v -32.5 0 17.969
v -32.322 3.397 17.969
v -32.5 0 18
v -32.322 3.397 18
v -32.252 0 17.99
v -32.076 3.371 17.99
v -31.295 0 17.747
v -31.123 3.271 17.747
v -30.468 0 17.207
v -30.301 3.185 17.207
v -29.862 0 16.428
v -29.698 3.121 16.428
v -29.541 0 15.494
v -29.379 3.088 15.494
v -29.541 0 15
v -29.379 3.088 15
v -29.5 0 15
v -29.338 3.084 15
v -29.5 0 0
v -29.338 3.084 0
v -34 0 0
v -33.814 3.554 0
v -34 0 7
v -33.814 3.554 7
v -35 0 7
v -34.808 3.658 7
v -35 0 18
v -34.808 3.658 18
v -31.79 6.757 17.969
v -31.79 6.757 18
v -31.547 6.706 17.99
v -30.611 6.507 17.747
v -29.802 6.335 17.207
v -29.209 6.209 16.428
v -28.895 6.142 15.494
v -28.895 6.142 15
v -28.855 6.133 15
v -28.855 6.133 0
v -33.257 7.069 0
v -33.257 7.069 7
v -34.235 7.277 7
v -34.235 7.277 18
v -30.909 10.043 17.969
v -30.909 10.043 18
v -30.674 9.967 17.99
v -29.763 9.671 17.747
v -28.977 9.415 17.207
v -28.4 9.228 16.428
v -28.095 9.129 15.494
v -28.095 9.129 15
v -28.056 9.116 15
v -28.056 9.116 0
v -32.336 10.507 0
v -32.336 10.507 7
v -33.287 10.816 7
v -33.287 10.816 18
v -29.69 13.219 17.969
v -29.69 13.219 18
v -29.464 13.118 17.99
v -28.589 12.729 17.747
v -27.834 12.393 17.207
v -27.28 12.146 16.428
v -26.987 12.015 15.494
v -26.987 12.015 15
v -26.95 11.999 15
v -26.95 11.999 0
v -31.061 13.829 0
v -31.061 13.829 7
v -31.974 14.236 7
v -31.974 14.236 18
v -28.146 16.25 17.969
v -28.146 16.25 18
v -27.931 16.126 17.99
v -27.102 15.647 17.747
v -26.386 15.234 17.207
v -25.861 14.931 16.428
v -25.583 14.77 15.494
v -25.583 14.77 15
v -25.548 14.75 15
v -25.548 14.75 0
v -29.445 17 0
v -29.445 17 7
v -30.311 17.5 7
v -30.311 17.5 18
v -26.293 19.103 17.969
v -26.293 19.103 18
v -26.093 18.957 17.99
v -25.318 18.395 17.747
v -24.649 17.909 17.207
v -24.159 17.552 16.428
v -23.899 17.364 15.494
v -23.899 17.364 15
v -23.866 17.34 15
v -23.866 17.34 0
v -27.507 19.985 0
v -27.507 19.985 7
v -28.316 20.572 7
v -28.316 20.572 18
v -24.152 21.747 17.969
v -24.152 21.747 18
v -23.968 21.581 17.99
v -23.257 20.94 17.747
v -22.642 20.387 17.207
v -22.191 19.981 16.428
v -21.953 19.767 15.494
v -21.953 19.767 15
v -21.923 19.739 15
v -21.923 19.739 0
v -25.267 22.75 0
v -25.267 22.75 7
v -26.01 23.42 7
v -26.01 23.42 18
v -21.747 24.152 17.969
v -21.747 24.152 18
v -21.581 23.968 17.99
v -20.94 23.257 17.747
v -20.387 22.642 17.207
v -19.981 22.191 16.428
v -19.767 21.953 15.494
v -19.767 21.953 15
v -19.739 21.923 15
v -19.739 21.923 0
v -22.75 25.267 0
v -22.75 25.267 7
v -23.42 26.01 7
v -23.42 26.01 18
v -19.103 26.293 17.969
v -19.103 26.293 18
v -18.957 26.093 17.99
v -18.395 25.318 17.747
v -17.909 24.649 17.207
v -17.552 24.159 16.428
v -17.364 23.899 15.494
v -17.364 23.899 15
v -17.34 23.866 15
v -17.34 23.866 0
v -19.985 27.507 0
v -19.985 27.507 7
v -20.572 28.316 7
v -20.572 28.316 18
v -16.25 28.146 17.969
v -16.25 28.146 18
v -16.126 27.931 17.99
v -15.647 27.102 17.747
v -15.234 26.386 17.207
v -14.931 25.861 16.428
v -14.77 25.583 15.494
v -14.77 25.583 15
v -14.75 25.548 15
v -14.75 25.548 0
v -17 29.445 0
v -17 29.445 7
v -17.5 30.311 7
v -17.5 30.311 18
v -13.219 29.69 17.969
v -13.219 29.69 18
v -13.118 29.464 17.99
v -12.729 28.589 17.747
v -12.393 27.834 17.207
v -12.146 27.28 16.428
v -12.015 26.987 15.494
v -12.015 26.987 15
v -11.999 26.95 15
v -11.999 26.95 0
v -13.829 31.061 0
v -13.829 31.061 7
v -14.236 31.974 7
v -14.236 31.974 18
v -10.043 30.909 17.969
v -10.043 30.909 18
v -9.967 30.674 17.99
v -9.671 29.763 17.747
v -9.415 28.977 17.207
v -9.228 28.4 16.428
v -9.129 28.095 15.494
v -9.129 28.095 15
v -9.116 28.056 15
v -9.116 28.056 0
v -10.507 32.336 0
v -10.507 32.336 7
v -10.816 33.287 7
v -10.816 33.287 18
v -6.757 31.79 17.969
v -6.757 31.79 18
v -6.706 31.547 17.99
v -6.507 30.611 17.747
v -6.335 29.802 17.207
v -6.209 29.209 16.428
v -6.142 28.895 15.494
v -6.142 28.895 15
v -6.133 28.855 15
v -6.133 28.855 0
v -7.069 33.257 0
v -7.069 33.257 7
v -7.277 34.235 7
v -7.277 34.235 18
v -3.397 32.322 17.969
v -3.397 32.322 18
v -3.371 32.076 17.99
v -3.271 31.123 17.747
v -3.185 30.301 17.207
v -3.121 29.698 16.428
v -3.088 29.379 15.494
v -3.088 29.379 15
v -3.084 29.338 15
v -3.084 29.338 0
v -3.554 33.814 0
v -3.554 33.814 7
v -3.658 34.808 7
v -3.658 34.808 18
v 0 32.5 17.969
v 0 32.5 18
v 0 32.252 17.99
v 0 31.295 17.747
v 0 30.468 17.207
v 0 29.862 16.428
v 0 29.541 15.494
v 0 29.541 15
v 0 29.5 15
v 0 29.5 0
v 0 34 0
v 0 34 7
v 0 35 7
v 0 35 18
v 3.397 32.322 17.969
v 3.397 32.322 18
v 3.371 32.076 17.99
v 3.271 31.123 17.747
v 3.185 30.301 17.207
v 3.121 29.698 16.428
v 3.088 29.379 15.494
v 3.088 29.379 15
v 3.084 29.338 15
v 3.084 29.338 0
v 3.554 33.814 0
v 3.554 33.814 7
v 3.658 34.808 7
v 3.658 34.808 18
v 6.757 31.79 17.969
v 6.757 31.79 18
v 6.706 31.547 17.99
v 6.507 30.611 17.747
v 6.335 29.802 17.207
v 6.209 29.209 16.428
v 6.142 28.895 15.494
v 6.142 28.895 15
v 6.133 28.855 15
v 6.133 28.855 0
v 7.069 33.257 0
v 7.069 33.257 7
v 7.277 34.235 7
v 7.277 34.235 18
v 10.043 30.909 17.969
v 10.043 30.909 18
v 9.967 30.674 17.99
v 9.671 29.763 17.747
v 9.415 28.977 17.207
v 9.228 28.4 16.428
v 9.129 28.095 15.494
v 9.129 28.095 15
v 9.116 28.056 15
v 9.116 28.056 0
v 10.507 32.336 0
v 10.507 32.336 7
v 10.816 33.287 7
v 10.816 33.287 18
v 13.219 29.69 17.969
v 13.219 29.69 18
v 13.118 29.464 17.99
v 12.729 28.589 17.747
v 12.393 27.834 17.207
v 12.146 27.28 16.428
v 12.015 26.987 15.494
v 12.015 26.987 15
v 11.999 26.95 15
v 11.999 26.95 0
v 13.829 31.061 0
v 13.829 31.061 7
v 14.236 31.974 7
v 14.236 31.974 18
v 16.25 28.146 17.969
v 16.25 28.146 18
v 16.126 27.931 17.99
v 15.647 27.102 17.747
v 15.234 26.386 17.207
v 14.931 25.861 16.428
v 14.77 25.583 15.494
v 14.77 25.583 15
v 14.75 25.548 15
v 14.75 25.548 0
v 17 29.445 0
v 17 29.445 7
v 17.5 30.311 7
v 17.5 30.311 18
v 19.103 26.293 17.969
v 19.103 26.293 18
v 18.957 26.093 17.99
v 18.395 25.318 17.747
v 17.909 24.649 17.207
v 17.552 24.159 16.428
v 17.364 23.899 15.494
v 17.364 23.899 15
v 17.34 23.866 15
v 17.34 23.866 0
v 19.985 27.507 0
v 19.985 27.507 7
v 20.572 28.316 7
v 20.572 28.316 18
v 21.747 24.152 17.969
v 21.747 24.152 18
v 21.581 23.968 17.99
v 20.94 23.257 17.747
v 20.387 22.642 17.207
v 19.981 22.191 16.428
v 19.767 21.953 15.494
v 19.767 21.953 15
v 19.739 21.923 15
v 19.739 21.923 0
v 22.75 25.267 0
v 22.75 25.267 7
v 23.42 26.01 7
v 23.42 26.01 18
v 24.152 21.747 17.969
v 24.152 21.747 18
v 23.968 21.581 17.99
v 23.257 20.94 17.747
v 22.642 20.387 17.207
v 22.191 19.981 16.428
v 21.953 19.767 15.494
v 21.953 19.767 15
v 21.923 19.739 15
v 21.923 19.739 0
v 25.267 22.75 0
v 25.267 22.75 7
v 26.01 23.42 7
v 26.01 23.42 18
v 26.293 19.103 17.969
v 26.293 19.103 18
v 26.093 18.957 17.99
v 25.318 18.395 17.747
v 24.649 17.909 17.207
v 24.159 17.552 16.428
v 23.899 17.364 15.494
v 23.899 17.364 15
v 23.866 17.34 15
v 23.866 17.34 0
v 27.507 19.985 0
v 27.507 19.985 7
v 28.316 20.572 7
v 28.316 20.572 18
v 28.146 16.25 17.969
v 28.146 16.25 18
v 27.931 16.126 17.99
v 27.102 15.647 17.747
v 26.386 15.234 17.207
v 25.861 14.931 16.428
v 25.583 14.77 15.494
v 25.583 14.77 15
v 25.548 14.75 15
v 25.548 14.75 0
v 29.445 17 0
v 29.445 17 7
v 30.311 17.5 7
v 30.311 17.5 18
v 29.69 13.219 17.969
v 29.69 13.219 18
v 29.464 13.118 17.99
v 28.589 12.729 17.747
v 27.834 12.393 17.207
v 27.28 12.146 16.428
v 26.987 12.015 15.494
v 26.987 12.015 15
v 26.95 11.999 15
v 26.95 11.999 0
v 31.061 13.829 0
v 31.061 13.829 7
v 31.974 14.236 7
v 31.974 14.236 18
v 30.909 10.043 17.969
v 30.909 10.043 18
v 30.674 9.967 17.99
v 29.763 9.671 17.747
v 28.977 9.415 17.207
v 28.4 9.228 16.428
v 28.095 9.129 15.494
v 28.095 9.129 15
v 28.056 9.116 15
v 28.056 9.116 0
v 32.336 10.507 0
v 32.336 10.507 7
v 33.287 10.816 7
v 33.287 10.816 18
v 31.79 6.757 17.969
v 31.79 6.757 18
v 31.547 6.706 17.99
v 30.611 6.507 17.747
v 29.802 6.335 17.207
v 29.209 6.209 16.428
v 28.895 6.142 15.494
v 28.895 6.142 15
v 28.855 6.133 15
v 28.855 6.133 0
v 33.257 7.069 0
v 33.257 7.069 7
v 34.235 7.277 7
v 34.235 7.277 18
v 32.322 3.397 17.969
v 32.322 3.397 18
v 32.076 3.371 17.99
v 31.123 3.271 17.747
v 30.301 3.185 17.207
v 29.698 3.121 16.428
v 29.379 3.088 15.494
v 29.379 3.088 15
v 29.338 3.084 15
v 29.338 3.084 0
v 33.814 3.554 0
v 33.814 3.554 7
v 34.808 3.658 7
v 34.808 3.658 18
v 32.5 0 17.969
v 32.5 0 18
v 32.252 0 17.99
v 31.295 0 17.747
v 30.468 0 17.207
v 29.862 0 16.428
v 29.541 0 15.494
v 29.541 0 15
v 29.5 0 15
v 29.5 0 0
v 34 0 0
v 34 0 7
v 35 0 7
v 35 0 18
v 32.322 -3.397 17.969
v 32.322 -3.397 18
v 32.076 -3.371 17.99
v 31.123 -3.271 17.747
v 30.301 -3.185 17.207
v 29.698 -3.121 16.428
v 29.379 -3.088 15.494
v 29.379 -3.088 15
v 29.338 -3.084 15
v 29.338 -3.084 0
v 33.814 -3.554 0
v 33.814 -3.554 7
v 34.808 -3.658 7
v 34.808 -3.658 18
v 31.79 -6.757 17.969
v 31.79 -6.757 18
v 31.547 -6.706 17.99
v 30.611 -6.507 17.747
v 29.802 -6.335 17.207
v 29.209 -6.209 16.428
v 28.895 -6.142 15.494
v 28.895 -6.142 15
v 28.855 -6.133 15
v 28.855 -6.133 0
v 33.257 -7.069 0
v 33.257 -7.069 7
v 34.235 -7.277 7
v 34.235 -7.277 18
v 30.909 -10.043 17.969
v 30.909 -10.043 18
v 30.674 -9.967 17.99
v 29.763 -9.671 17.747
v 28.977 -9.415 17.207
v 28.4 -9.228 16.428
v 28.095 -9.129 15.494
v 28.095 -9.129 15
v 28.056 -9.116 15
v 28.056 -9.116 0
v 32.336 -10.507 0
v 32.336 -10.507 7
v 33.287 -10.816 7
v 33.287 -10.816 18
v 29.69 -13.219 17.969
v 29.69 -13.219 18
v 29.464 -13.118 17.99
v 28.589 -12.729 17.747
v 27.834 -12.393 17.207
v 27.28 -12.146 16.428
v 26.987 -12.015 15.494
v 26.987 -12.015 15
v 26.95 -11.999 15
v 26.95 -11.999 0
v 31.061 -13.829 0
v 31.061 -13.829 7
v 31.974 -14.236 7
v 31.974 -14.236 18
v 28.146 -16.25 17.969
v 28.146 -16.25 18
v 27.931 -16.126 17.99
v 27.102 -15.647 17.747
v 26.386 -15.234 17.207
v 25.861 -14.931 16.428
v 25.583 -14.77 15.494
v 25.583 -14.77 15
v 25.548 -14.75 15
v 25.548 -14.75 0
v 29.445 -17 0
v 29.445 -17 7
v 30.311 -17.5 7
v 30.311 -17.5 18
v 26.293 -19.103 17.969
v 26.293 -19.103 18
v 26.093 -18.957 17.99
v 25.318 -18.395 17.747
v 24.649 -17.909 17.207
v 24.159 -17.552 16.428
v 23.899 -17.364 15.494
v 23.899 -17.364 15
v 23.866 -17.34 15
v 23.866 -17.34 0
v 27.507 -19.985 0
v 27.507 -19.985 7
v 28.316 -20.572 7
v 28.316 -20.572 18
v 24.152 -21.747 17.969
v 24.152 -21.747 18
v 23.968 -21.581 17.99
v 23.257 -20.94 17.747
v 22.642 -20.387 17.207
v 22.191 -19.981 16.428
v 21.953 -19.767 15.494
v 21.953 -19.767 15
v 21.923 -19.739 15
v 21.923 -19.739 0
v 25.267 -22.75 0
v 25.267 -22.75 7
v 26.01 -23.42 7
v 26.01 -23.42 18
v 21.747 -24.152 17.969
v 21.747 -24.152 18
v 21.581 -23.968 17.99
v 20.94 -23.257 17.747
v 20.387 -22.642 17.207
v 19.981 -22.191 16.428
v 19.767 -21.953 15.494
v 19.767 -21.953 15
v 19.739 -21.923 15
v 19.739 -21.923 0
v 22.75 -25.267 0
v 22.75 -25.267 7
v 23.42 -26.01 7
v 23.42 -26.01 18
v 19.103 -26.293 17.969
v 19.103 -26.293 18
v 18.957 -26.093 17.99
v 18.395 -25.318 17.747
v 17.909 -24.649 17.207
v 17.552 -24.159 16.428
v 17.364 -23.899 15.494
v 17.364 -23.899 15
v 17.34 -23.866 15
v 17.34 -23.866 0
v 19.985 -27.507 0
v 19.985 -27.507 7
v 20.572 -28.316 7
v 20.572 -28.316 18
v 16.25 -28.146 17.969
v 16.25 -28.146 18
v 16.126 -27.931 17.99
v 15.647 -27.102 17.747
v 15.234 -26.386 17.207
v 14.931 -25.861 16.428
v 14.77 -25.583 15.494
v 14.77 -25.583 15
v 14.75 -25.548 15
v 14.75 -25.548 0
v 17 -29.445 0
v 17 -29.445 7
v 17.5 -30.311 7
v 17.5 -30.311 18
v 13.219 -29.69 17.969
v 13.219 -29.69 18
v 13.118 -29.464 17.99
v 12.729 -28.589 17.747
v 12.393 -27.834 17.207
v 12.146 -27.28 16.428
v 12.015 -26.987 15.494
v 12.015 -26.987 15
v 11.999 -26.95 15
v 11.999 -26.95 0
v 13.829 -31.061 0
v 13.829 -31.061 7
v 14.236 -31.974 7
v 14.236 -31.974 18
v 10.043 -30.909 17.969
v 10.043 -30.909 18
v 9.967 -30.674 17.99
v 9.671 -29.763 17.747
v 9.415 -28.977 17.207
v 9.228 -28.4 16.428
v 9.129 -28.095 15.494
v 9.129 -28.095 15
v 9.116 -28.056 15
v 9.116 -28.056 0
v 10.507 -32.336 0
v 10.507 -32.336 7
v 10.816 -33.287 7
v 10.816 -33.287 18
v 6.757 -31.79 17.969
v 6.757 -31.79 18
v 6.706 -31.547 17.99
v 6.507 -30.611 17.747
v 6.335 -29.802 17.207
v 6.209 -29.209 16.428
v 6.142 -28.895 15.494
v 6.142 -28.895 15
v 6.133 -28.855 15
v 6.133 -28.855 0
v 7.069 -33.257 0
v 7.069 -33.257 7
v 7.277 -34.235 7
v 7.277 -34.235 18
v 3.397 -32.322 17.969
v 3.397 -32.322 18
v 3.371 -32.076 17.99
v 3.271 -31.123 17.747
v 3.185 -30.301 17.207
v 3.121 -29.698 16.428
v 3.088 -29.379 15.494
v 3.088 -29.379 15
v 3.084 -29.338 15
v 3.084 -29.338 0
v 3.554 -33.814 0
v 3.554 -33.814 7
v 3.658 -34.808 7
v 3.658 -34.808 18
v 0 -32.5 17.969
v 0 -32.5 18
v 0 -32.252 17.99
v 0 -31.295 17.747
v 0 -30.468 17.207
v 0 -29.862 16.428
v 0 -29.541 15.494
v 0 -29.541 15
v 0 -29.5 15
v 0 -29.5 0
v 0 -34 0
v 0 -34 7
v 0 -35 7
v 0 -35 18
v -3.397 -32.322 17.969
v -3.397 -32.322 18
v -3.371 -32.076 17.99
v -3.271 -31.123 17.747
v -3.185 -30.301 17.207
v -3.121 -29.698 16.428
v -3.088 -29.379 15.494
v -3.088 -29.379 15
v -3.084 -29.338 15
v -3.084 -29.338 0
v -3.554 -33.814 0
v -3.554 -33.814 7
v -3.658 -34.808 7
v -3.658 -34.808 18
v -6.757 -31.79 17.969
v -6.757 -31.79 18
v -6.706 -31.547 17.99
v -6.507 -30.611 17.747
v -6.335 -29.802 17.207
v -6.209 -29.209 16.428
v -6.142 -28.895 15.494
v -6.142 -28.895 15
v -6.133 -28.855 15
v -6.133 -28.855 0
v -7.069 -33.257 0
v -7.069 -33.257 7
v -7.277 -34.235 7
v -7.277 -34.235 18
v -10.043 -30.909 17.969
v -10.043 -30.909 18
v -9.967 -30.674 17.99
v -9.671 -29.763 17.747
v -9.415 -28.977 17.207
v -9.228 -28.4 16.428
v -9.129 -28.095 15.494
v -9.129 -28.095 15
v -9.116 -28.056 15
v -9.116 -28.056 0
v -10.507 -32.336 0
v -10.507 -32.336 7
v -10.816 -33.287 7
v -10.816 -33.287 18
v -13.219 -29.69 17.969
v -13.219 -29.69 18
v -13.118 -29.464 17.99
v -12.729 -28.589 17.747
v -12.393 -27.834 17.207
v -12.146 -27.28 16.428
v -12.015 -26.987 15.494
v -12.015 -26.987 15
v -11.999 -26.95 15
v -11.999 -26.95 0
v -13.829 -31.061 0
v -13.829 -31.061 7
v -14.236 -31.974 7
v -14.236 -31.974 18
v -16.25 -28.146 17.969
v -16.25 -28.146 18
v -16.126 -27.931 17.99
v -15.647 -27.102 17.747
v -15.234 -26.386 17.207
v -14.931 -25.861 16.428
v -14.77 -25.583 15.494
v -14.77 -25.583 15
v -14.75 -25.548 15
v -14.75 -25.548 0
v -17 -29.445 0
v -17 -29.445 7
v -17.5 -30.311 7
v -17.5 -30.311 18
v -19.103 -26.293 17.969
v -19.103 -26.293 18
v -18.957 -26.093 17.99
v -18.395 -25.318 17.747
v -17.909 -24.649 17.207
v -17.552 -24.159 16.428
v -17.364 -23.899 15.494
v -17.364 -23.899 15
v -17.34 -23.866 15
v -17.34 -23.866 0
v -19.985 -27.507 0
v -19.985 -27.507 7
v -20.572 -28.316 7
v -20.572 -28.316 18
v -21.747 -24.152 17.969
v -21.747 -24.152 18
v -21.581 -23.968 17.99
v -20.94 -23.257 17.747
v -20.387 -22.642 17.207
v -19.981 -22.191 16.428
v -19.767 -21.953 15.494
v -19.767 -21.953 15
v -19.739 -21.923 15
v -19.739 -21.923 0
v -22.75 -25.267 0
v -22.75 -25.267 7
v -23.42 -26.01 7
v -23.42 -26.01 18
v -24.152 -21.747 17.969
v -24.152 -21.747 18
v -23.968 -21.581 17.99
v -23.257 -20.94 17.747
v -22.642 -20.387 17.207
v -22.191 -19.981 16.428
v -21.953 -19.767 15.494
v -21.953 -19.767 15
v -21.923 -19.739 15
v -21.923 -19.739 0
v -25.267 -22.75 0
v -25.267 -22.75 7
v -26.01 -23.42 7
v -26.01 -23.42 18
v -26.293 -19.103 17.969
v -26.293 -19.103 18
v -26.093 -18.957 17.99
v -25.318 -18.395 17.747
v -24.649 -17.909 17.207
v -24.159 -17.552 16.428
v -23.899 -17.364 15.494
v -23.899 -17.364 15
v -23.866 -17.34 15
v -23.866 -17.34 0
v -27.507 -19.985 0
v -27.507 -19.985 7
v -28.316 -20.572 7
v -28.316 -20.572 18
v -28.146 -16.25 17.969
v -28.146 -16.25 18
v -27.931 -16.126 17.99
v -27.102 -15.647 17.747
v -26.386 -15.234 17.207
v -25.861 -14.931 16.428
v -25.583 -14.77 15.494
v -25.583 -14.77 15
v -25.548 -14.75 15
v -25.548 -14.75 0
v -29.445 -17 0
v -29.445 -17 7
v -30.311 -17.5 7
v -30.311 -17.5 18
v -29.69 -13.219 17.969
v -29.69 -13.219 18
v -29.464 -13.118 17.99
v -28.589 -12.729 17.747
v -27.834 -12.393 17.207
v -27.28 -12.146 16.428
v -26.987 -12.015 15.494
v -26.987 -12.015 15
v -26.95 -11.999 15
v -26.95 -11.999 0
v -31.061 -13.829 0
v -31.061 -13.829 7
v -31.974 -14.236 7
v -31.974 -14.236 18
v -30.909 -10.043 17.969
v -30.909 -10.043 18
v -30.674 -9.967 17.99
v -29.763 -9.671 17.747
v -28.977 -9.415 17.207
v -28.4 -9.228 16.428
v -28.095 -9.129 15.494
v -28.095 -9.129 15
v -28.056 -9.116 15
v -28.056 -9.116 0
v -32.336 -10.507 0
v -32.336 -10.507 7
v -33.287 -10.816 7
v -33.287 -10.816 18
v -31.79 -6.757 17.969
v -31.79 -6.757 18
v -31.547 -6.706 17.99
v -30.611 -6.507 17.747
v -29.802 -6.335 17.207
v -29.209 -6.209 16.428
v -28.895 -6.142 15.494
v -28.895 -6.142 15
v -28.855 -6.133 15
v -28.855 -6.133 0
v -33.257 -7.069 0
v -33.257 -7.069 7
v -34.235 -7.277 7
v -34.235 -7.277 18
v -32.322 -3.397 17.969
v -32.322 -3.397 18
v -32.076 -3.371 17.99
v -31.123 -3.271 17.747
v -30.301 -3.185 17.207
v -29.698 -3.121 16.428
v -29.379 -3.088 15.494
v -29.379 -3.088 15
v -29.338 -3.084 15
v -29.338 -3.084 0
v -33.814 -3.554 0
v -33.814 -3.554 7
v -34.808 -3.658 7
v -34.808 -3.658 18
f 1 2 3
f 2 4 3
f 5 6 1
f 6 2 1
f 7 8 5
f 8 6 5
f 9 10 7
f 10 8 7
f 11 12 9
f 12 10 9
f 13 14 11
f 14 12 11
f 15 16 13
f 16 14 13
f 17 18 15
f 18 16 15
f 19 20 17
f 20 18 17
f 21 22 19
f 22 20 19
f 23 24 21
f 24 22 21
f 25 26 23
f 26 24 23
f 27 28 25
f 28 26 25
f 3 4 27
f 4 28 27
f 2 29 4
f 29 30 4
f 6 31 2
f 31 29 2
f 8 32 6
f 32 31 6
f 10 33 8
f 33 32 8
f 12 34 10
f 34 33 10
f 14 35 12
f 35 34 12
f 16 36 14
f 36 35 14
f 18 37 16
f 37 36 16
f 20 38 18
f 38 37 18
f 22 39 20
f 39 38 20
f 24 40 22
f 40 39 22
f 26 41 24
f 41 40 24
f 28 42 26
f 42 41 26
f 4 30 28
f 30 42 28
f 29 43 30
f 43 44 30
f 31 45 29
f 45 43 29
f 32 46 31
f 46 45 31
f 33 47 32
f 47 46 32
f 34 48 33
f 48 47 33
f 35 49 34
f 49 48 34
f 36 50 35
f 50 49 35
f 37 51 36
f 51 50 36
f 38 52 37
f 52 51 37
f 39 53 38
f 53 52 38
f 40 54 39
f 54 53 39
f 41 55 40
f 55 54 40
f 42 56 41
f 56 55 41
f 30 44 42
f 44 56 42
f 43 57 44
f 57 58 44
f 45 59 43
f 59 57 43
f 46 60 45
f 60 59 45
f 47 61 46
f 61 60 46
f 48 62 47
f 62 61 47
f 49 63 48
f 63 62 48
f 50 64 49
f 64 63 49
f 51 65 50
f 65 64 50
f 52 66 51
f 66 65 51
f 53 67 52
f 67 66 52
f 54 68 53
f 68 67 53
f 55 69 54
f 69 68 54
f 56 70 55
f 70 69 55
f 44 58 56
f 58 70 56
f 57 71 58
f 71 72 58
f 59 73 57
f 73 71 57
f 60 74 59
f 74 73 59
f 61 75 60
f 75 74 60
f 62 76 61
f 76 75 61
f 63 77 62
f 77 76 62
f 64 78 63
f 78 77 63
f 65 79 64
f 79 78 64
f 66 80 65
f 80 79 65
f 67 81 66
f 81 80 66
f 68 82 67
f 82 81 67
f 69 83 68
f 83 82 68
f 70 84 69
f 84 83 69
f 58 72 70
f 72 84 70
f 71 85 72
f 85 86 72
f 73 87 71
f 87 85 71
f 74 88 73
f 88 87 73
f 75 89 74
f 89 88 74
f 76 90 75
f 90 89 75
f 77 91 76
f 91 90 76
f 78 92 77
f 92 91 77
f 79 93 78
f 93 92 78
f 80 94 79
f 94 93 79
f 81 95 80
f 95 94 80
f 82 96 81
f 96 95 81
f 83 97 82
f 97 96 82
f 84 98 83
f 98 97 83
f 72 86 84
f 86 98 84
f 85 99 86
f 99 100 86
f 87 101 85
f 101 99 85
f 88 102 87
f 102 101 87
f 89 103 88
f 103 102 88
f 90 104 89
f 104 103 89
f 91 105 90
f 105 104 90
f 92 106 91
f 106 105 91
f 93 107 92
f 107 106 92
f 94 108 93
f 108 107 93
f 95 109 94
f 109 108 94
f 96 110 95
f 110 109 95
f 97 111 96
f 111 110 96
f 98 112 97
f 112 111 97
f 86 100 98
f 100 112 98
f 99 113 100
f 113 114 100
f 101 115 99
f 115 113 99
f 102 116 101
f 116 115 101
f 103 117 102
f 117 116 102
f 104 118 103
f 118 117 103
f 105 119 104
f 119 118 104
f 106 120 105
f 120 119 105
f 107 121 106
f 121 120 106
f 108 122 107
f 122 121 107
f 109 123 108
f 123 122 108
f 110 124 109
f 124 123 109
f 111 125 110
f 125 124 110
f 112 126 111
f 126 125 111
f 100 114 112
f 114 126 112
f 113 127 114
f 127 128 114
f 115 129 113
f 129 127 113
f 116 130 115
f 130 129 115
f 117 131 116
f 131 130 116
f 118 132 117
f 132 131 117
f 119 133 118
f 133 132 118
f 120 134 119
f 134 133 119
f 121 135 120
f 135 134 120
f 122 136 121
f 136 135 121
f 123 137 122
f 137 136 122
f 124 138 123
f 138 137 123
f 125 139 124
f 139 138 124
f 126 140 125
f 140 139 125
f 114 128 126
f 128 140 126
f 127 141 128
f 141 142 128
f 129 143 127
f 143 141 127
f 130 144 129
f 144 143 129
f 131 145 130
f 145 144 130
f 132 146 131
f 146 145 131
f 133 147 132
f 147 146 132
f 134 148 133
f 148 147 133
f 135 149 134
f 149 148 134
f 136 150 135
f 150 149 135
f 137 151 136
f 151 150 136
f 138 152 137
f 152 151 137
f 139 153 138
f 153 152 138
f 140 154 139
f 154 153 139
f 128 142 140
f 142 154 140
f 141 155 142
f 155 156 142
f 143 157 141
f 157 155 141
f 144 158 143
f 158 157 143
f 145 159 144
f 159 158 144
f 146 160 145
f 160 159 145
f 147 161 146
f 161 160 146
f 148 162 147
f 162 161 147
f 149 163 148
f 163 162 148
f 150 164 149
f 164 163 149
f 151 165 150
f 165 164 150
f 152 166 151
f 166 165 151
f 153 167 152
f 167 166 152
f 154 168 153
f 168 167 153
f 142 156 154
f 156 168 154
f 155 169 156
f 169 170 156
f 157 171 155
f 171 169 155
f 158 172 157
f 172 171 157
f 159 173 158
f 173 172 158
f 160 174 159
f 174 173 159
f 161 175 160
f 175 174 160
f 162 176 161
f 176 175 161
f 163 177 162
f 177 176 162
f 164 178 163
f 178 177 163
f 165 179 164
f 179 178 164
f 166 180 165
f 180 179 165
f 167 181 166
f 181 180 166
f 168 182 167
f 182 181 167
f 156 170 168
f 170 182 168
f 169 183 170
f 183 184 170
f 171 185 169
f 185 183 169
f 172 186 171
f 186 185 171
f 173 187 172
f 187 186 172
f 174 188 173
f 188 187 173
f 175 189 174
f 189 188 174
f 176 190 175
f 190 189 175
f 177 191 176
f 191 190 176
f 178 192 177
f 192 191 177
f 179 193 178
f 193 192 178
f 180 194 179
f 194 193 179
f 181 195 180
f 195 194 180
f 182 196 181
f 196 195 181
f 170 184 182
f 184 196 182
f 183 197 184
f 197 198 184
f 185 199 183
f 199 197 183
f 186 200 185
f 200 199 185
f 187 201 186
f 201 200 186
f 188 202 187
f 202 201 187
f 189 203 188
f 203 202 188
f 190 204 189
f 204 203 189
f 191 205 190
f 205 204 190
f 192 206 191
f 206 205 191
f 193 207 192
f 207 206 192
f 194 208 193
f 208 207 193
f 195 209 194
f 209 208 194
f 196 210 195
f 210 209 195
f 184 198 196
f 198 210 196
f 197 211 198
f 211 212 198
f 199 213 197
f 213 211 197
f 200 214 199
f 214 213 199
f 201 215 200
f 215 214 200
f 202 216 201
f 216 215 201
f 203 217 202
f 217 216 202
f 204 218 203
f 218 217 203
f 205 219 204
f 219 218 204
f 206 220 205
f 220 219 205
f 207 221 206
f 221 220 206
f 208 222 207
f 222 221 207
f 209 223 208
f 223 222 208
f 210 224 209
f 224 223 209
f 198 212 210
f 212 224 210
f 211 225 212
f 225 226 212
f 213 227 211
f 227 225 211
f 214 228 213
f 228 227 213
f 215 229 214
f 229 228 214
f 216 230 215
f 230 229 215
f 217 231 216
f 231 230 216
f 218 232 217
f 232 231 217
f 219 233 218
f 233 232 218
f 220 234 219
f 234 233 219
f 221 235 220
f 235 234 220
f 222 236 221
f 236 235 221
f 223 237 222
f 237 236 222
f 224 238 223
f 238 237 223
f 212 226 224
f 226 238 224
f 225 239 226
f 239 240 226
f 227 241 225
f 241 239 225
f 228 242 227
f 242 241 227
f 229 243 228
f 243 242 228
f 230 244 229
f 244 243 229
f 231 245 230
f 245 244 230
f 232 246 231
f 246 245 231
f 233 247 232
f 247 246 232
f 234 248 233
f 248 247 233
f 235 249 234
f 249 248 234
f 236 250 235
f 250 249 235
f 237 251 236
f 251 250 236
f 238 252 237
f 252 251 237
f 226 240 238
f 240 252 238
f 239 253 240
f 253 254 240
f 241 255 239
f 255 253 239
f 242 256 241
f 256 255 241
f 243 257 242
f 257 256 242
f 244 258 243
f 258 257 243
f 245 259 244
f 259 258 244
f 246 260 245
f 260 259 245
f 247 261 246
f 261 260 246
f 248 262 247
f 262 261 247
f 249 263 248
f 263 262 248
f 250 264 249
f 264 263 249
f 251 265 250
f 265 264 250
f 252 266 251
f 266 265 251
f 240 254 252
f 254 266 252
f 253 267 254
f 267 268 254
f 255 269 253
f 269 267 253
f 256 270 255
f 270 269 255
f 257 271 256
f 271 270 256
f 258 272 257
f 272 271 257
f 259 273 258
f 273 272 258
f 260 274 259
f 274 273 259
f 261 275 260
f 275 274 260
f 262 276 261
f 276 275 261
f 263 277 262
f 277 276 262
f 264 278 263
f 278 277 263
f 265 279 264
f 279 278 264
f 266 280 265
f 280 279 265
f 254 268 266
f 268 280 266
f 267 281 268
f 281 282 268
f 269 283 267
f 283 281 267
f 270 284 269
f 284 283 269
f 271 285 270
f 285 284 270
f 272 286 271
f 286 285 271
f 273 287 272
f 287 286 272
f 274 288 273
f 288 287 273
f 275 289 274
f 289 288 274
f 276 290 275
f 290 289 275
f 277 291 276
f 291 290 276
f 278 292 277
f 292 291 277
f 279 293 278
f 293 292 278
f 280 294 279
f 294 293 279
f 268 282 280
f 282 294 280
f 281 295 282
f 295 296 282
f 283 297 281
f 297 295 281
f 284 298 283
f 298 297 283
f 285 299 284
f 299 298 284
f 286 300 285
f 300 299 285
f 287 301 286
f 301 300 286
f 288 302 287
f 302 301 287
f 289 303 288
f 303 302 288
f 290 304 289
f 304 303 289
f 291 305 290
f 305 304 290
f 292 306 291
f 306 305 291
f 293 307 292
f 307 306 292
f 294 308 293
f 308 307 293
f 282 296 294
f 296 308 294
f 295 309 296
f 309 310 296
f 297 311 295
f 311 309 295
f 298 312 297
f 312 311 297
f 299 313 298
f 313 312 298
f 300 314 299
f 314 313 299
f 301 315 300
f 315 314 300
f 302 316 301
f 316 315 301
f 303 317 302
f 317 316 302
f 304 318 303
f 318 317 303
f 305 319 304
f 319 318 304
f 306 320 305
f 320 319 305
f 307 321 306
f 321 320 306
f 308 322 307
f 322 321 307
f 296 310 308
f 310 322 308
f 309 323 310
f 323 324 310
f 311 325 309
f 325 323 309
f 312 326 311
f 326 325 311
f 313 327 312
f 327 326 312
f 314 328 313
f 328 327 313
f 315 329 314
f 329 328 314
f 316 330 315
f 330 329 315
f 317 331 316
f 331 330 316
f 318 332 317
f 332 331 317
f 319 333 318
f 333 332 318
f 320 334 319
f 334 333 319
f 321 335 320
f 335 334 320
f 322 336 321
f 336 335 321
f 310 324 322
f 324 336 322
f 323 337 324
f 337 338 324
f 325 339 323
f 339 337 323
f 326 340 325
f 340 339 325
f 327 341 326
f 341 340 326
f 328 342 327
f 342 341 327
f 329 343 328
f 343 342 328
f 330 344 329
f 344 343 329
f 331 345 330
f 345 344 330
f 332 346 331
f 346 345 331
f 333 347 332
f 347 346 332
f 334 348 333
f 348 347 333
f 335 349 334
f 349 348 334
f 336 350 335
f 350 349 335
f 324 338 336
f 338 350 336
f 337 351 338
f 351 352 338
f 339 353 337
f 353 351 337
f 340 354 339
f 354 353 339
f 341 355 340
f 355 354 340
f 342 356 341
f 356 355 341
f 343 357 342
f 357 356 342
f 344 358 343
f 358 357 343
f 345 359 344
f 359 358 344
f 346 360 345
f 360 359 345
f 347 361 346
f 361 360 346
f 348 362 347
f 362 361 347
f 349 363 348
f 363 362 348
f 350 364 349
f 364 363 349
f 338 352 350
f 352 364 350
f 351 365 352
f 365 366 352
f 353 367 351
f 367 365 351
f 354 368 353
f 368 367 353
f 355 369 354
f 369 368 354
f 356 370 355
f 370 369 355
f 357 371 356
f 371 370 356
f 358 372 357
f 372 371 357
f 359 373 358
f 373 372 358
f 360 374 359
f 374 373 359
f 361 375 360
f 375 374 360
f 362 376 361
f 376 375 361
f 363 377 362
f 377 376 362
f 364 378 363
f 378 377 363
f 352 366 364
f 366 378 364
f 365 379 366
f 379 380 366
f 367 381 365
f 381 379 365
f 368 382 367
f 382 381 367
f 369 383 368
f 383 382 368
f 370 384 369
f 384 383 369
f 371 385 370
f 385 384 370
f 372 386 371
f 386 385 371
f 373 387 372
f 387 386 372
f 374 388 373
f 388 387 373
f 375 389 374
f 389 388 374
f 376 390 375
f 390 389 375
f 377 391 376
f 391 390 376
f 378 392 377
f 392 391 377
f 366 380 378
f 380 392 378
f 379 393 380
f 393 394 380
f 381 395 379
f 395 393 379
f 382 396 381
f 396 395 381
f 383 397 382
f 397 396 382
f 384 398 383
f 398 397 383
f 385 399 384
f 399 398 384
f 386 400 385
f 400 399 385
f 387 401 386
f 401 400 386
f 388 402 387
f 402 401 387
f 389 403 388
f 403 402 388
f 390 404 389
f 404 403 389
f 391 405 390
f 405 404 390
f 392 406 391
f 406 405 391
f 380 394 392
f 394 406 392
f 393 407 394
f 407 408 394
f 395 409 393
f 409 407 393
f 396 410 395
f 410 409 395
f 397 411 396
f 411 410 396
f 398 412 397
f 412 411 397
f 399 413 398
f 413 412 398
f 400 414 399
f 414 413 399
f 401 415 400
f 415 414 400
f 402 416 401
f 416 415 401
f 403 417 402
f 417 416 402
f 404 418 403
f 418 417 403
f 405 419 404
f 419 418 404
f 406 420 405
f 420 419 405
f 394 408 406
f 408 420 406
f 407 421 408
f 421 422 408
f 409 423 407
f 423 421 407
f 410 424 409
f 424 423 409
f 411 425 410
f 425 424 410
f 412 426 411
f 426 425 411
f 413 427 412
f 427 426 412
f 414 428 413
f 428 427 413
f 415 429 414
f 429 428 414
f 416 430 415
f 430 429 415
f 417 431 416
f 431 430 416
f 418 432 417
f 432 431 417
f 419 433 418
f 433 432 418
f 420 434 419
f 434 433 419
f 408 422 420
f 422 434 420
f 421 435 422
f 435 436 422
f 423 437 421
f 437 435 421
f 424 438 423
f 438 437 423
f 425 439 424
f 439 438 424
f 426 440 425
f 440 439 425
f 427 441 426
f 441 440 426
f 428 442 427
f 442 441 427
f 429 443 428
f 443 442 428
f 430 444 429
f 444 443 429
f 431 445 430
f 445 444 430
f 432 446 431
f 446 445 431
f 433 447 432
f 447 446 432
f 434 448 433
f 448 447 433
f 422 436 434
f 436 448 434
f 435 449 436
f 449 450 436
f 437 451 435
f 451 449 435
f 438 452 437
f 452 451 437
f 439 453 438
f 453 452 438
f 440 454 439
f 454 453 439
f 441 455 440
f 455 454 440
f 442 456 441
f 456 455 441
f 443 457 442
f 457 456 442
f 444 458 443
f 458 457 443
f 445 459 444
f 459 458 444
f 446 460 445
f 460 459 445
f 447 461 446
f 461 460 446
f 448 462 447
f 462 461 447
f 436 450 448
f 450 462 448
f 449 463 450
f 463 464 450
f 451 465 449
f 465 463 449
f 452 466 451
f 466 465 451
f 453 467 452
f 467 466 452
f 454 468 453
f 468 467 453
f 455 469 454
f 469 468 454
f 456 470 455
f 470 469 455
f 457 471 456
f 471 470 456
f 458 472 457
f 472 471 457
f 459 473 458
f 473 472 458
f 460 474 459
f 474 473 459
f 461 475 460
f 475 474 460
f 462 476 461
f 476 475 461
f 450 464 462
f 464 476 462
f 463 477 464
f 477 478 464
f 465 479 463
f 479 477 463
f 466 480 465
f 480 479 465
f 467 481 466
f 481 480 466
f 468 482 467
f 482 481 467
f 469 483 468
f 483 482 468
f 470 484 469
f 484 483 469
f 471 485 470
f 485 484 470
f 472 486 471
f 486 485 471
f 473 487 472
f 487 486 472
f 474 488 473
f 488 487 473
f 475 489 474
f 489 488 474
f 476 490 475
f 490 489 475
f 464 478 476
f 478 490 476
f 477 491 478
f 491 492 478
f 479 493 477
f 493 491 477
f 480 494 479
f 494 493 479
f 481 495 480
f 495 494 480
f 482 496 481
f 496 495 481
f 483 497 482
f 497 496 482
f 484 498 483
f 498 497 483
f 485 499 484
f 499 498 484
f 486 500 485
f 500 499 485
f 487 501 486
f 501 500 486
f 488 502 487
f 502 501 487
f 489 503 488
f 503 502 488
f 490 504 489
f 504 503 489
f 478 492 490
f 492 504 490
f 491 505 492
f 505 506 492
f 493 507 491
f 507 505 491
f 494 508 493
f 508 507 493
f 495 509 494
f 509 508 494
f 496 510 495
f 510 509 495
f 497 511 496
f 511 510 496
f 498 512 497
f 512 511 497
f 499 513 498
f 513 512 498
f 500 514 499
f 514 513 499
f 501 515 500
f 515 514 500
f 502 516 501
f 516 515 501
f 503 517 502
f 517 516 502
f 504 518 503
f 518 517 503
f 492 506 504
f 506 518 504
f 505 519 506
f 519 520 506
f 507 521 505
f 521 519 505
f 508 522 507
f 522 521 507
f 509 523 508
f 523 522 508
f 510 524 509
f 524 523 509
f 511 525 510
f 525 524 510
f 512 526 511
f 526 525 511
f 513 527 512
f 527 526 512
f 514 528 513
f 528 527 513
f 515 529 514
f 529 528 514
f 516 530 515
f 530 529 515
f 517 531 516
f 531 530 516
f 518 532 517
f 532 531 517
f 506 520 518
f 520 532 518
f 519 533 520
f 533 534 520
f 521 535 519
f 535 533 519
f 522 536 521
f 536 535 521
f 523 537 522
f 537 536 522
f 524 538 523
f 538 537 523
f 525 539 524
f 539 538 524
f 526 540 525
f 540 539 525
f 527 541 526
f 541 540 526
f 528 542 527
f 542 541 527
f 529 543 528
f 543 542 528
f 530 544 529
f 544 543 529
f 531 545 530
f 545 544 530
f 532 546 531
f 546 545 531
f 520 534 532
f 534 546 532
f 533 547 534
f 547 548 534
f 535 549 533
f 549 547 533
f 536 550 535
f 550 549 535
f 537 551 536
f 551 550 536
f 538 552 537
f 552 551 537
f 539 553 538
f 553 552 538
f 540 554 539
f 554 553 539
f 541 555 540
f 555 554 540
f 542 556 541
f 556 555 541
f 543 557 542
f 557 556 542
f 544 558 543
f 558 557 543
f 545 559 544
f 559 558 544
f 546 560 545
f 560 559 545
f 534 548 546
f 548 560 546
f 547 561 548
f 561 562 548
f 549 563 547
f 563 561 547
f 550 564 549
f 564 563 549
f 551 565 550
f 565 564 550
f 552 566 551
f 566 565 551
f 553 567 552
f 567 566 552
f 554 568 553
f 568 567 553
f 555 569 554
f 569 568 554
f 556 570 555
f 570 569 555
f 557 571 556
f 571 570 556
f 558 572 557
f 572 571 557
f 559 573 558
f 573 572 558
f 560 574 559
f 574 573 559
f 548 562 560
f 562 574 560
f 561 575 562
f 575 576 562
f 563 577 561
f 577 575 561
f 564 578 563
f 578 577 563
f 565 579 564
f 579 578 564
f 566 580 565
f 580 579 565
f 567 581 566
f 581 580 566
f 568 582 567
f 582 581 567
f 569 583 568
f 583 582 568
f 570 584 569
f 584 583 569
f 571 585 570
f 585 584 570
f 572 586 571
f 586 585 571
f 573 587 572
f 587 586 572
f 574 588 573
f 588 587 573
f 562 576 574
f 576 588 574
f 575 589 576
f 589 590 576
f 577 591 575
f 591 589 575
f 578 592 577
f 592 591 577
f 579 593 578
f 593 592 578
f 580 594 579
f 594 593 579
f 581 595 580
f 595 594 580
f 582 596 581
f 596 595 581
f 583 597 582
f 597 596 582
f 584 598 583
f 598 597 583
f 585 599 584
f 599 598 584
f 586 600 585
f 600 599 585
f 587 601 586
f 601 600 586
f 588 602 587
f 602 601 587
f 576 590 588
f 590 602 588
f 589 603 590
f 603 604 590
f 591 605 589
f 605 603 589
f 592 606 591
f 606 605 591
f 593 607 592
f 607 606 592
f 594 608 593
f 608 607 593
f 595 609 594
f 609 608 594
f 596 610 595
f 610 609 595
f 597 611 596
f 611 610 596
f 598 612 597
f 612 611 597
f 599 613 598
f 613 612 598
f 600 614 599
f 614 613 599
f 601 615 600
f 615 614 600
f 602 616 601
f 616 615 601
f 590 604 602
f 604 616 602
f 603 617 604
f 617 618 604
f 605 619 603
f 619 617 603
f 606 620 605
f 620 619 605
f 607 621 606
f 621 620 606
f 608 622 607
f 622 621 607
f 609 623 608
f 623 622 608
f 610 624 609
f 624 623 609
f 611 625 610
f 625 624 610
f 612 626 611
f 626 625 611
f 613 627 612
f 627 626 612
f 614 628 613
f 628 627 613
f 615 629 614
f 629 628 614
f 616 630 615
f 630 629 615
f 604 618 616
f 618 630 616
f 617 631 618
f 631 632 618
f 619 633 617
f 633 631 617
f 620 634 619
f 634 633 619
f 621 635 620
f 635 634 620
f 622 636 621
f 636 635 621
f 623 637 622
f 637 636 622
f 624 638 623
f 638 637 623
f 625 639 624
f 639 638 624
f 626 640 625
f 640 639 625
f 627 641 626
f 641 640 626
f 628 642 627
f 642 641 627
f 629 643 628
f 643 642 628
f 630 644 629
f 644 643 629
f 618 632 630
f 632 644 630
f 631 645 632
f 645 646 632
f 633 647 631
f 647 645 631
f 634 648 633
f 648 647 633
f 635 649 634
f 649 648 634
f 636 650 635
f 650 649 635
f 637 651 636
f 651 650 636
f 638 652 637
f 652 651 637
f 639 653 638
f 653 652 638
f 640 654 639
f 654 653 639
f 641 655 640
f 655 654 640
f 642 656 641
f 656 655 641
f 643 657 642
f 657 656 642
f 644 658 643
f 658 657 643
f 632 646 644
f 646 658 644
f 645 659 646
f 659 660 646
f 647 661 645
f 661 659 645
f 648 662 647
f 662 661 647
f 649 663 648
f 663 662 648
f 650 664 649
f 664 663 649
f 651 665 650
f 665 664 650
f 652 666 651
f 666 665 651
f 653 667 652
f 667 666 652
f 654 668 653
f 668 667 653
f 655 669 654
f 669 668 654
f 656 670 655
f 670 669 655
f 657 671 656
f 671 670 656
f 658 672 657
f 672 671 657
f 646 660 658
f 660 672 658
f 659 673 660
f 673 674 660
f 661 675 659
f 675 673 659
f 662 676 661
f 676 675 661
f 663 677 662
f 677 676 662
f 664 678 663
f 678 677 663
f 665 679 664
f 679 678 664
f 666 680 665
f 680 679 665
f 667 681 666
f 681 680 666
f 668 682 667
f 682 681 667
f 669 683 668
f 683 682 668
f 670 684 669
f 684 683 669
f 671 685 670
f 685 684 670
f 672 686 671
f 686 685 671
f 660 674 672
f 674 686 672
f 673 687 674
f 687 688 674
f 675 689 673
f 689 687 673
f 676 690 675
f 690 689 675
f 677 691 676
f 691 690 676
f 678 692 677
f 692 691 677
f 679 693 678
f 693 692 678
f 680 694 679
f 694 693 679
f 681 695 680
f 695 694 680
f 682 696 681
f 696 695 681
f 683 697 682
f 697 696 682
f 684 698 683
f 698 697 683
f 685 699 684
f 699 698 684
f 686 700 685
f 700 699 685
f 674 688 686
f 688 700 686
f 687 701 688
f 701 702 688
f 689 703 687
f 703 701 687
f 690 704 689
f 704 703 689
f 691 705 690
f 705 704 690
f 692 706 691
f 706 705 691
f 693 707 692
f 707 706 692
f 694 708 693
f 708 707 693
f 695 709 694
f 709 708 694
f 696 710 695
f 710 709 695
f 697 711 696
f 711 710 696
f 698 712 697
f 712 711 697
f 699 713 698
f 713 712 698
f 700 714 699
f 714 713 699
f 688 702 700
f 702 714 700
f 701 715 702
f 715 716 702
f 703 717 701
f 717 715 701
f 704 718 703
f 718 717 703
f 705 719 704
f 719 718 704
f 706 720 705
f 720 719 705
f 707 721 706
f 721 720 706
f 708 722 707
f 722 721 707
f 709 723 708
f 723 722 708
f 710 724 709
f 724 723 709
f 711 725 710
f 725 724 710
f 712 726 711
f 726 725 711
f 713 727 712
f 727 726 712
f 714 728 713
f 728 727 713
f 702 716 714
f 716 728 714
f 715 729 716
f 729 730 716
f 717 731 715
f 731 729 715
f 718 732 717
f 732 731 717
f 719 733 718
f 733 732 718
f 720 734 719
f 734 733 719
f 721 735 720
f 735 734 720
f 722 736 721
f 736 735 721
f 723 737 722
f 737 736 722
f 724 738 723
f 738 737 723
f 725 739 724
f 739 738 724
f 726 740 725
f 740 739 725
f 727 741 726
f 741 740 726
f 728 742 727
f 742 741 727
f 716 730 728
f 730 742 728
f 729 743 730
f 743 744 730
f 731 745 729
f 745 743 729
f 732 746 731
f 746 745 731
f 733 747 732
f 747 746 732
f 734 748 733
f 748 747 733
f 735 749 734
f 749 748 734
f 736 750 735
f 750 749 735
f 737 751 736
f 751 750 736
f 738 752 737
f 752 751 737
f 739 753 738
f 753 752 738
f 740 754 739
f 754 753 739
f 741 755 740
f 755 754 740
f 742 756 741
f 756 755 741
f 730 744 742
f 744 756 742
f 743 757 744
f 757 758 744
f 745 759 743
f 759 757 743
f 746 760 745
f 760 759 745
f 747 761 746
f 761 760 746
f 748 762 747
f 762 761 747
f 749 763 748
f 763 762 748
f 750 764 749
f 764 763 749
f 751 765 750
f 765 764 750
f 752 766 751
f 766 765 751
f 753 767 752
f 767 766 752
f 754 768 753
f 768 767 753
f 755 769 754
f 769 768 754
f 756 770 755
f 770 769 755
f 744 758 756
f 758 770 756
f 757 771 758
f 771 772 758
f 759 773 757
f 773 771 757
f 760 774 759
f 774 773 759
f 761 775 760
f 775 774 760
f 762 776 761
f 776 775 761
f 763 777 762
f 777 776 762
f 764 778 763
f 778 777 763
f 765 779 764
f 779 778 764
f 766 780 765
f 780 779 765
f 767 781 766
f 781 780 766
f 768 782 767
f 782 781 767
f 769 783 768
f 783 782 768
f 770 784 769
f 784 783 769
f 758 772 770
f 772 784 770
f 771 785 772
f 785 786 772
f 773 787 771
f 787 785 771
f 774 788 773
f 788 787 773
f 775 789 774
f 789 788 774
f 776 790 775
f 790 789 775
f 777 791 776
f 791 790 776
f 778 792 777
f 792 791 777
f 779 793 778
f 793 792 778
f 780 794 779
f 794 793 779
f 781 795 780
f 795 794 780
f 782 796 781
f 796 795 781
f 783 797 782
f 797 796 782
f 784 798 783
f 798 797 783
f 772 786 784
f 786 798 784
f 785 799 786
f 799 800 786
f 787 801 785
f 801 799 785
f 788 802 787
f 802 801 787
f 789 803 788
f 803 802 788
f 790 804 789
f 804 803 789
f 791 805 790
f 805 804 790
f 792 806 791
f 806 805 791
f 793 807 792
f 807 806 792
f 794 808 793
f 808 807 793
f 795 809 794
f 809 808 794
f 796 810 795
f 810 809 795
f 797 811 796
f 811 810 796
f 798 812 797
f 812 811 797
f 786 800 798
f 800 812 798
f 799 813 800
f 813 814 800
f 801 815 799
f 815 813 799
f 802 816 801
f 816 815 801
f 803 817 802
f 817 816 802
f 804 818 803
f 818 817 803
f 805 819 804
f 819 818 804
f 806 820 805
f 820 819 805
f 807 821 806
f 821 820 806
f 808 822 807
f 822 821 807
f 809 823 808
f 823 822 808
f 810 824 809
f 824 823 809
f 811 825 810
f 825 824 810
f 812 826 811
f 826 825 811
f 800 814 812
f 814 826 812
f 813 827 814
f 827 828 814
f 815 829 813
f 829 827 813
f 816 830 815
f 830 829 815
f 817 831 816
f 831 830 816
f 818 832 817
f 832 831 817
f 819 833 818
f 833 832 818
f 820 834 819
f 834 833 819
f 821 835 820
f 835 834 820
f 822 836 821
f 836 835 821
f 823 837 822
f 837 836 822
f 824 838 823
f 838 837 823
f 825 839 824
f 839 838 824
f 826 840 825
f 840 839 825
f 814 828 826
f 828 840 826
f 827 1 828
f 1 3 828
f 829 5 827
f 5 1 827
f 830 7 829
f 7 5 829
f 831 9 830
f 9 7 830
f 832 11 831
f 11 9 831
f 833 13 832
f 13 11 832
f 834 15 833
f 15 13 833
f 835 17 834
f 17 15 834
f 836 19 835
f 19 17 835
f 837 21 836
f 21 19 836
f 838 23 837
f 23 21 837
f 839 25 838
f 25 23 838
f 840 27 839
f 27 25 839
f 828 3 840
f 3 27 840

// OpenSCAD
$fs=$fs/2;
$fa=$fa/2;

r = 3;
r2 = 59/2;


rotate_extrude(){
    translate([r2,0,0]) square([4.5,7]);
    translate([r2,7,0]) square([5.5,11-r]);
    translate([r2+r,7,0]) square([5.5-r,11]);
    translate([r2+r,11+7-r,0]) difference(){
        circle (r);
        translate([5.5-r,-3])square([5.5,11-r]);
    }
}
